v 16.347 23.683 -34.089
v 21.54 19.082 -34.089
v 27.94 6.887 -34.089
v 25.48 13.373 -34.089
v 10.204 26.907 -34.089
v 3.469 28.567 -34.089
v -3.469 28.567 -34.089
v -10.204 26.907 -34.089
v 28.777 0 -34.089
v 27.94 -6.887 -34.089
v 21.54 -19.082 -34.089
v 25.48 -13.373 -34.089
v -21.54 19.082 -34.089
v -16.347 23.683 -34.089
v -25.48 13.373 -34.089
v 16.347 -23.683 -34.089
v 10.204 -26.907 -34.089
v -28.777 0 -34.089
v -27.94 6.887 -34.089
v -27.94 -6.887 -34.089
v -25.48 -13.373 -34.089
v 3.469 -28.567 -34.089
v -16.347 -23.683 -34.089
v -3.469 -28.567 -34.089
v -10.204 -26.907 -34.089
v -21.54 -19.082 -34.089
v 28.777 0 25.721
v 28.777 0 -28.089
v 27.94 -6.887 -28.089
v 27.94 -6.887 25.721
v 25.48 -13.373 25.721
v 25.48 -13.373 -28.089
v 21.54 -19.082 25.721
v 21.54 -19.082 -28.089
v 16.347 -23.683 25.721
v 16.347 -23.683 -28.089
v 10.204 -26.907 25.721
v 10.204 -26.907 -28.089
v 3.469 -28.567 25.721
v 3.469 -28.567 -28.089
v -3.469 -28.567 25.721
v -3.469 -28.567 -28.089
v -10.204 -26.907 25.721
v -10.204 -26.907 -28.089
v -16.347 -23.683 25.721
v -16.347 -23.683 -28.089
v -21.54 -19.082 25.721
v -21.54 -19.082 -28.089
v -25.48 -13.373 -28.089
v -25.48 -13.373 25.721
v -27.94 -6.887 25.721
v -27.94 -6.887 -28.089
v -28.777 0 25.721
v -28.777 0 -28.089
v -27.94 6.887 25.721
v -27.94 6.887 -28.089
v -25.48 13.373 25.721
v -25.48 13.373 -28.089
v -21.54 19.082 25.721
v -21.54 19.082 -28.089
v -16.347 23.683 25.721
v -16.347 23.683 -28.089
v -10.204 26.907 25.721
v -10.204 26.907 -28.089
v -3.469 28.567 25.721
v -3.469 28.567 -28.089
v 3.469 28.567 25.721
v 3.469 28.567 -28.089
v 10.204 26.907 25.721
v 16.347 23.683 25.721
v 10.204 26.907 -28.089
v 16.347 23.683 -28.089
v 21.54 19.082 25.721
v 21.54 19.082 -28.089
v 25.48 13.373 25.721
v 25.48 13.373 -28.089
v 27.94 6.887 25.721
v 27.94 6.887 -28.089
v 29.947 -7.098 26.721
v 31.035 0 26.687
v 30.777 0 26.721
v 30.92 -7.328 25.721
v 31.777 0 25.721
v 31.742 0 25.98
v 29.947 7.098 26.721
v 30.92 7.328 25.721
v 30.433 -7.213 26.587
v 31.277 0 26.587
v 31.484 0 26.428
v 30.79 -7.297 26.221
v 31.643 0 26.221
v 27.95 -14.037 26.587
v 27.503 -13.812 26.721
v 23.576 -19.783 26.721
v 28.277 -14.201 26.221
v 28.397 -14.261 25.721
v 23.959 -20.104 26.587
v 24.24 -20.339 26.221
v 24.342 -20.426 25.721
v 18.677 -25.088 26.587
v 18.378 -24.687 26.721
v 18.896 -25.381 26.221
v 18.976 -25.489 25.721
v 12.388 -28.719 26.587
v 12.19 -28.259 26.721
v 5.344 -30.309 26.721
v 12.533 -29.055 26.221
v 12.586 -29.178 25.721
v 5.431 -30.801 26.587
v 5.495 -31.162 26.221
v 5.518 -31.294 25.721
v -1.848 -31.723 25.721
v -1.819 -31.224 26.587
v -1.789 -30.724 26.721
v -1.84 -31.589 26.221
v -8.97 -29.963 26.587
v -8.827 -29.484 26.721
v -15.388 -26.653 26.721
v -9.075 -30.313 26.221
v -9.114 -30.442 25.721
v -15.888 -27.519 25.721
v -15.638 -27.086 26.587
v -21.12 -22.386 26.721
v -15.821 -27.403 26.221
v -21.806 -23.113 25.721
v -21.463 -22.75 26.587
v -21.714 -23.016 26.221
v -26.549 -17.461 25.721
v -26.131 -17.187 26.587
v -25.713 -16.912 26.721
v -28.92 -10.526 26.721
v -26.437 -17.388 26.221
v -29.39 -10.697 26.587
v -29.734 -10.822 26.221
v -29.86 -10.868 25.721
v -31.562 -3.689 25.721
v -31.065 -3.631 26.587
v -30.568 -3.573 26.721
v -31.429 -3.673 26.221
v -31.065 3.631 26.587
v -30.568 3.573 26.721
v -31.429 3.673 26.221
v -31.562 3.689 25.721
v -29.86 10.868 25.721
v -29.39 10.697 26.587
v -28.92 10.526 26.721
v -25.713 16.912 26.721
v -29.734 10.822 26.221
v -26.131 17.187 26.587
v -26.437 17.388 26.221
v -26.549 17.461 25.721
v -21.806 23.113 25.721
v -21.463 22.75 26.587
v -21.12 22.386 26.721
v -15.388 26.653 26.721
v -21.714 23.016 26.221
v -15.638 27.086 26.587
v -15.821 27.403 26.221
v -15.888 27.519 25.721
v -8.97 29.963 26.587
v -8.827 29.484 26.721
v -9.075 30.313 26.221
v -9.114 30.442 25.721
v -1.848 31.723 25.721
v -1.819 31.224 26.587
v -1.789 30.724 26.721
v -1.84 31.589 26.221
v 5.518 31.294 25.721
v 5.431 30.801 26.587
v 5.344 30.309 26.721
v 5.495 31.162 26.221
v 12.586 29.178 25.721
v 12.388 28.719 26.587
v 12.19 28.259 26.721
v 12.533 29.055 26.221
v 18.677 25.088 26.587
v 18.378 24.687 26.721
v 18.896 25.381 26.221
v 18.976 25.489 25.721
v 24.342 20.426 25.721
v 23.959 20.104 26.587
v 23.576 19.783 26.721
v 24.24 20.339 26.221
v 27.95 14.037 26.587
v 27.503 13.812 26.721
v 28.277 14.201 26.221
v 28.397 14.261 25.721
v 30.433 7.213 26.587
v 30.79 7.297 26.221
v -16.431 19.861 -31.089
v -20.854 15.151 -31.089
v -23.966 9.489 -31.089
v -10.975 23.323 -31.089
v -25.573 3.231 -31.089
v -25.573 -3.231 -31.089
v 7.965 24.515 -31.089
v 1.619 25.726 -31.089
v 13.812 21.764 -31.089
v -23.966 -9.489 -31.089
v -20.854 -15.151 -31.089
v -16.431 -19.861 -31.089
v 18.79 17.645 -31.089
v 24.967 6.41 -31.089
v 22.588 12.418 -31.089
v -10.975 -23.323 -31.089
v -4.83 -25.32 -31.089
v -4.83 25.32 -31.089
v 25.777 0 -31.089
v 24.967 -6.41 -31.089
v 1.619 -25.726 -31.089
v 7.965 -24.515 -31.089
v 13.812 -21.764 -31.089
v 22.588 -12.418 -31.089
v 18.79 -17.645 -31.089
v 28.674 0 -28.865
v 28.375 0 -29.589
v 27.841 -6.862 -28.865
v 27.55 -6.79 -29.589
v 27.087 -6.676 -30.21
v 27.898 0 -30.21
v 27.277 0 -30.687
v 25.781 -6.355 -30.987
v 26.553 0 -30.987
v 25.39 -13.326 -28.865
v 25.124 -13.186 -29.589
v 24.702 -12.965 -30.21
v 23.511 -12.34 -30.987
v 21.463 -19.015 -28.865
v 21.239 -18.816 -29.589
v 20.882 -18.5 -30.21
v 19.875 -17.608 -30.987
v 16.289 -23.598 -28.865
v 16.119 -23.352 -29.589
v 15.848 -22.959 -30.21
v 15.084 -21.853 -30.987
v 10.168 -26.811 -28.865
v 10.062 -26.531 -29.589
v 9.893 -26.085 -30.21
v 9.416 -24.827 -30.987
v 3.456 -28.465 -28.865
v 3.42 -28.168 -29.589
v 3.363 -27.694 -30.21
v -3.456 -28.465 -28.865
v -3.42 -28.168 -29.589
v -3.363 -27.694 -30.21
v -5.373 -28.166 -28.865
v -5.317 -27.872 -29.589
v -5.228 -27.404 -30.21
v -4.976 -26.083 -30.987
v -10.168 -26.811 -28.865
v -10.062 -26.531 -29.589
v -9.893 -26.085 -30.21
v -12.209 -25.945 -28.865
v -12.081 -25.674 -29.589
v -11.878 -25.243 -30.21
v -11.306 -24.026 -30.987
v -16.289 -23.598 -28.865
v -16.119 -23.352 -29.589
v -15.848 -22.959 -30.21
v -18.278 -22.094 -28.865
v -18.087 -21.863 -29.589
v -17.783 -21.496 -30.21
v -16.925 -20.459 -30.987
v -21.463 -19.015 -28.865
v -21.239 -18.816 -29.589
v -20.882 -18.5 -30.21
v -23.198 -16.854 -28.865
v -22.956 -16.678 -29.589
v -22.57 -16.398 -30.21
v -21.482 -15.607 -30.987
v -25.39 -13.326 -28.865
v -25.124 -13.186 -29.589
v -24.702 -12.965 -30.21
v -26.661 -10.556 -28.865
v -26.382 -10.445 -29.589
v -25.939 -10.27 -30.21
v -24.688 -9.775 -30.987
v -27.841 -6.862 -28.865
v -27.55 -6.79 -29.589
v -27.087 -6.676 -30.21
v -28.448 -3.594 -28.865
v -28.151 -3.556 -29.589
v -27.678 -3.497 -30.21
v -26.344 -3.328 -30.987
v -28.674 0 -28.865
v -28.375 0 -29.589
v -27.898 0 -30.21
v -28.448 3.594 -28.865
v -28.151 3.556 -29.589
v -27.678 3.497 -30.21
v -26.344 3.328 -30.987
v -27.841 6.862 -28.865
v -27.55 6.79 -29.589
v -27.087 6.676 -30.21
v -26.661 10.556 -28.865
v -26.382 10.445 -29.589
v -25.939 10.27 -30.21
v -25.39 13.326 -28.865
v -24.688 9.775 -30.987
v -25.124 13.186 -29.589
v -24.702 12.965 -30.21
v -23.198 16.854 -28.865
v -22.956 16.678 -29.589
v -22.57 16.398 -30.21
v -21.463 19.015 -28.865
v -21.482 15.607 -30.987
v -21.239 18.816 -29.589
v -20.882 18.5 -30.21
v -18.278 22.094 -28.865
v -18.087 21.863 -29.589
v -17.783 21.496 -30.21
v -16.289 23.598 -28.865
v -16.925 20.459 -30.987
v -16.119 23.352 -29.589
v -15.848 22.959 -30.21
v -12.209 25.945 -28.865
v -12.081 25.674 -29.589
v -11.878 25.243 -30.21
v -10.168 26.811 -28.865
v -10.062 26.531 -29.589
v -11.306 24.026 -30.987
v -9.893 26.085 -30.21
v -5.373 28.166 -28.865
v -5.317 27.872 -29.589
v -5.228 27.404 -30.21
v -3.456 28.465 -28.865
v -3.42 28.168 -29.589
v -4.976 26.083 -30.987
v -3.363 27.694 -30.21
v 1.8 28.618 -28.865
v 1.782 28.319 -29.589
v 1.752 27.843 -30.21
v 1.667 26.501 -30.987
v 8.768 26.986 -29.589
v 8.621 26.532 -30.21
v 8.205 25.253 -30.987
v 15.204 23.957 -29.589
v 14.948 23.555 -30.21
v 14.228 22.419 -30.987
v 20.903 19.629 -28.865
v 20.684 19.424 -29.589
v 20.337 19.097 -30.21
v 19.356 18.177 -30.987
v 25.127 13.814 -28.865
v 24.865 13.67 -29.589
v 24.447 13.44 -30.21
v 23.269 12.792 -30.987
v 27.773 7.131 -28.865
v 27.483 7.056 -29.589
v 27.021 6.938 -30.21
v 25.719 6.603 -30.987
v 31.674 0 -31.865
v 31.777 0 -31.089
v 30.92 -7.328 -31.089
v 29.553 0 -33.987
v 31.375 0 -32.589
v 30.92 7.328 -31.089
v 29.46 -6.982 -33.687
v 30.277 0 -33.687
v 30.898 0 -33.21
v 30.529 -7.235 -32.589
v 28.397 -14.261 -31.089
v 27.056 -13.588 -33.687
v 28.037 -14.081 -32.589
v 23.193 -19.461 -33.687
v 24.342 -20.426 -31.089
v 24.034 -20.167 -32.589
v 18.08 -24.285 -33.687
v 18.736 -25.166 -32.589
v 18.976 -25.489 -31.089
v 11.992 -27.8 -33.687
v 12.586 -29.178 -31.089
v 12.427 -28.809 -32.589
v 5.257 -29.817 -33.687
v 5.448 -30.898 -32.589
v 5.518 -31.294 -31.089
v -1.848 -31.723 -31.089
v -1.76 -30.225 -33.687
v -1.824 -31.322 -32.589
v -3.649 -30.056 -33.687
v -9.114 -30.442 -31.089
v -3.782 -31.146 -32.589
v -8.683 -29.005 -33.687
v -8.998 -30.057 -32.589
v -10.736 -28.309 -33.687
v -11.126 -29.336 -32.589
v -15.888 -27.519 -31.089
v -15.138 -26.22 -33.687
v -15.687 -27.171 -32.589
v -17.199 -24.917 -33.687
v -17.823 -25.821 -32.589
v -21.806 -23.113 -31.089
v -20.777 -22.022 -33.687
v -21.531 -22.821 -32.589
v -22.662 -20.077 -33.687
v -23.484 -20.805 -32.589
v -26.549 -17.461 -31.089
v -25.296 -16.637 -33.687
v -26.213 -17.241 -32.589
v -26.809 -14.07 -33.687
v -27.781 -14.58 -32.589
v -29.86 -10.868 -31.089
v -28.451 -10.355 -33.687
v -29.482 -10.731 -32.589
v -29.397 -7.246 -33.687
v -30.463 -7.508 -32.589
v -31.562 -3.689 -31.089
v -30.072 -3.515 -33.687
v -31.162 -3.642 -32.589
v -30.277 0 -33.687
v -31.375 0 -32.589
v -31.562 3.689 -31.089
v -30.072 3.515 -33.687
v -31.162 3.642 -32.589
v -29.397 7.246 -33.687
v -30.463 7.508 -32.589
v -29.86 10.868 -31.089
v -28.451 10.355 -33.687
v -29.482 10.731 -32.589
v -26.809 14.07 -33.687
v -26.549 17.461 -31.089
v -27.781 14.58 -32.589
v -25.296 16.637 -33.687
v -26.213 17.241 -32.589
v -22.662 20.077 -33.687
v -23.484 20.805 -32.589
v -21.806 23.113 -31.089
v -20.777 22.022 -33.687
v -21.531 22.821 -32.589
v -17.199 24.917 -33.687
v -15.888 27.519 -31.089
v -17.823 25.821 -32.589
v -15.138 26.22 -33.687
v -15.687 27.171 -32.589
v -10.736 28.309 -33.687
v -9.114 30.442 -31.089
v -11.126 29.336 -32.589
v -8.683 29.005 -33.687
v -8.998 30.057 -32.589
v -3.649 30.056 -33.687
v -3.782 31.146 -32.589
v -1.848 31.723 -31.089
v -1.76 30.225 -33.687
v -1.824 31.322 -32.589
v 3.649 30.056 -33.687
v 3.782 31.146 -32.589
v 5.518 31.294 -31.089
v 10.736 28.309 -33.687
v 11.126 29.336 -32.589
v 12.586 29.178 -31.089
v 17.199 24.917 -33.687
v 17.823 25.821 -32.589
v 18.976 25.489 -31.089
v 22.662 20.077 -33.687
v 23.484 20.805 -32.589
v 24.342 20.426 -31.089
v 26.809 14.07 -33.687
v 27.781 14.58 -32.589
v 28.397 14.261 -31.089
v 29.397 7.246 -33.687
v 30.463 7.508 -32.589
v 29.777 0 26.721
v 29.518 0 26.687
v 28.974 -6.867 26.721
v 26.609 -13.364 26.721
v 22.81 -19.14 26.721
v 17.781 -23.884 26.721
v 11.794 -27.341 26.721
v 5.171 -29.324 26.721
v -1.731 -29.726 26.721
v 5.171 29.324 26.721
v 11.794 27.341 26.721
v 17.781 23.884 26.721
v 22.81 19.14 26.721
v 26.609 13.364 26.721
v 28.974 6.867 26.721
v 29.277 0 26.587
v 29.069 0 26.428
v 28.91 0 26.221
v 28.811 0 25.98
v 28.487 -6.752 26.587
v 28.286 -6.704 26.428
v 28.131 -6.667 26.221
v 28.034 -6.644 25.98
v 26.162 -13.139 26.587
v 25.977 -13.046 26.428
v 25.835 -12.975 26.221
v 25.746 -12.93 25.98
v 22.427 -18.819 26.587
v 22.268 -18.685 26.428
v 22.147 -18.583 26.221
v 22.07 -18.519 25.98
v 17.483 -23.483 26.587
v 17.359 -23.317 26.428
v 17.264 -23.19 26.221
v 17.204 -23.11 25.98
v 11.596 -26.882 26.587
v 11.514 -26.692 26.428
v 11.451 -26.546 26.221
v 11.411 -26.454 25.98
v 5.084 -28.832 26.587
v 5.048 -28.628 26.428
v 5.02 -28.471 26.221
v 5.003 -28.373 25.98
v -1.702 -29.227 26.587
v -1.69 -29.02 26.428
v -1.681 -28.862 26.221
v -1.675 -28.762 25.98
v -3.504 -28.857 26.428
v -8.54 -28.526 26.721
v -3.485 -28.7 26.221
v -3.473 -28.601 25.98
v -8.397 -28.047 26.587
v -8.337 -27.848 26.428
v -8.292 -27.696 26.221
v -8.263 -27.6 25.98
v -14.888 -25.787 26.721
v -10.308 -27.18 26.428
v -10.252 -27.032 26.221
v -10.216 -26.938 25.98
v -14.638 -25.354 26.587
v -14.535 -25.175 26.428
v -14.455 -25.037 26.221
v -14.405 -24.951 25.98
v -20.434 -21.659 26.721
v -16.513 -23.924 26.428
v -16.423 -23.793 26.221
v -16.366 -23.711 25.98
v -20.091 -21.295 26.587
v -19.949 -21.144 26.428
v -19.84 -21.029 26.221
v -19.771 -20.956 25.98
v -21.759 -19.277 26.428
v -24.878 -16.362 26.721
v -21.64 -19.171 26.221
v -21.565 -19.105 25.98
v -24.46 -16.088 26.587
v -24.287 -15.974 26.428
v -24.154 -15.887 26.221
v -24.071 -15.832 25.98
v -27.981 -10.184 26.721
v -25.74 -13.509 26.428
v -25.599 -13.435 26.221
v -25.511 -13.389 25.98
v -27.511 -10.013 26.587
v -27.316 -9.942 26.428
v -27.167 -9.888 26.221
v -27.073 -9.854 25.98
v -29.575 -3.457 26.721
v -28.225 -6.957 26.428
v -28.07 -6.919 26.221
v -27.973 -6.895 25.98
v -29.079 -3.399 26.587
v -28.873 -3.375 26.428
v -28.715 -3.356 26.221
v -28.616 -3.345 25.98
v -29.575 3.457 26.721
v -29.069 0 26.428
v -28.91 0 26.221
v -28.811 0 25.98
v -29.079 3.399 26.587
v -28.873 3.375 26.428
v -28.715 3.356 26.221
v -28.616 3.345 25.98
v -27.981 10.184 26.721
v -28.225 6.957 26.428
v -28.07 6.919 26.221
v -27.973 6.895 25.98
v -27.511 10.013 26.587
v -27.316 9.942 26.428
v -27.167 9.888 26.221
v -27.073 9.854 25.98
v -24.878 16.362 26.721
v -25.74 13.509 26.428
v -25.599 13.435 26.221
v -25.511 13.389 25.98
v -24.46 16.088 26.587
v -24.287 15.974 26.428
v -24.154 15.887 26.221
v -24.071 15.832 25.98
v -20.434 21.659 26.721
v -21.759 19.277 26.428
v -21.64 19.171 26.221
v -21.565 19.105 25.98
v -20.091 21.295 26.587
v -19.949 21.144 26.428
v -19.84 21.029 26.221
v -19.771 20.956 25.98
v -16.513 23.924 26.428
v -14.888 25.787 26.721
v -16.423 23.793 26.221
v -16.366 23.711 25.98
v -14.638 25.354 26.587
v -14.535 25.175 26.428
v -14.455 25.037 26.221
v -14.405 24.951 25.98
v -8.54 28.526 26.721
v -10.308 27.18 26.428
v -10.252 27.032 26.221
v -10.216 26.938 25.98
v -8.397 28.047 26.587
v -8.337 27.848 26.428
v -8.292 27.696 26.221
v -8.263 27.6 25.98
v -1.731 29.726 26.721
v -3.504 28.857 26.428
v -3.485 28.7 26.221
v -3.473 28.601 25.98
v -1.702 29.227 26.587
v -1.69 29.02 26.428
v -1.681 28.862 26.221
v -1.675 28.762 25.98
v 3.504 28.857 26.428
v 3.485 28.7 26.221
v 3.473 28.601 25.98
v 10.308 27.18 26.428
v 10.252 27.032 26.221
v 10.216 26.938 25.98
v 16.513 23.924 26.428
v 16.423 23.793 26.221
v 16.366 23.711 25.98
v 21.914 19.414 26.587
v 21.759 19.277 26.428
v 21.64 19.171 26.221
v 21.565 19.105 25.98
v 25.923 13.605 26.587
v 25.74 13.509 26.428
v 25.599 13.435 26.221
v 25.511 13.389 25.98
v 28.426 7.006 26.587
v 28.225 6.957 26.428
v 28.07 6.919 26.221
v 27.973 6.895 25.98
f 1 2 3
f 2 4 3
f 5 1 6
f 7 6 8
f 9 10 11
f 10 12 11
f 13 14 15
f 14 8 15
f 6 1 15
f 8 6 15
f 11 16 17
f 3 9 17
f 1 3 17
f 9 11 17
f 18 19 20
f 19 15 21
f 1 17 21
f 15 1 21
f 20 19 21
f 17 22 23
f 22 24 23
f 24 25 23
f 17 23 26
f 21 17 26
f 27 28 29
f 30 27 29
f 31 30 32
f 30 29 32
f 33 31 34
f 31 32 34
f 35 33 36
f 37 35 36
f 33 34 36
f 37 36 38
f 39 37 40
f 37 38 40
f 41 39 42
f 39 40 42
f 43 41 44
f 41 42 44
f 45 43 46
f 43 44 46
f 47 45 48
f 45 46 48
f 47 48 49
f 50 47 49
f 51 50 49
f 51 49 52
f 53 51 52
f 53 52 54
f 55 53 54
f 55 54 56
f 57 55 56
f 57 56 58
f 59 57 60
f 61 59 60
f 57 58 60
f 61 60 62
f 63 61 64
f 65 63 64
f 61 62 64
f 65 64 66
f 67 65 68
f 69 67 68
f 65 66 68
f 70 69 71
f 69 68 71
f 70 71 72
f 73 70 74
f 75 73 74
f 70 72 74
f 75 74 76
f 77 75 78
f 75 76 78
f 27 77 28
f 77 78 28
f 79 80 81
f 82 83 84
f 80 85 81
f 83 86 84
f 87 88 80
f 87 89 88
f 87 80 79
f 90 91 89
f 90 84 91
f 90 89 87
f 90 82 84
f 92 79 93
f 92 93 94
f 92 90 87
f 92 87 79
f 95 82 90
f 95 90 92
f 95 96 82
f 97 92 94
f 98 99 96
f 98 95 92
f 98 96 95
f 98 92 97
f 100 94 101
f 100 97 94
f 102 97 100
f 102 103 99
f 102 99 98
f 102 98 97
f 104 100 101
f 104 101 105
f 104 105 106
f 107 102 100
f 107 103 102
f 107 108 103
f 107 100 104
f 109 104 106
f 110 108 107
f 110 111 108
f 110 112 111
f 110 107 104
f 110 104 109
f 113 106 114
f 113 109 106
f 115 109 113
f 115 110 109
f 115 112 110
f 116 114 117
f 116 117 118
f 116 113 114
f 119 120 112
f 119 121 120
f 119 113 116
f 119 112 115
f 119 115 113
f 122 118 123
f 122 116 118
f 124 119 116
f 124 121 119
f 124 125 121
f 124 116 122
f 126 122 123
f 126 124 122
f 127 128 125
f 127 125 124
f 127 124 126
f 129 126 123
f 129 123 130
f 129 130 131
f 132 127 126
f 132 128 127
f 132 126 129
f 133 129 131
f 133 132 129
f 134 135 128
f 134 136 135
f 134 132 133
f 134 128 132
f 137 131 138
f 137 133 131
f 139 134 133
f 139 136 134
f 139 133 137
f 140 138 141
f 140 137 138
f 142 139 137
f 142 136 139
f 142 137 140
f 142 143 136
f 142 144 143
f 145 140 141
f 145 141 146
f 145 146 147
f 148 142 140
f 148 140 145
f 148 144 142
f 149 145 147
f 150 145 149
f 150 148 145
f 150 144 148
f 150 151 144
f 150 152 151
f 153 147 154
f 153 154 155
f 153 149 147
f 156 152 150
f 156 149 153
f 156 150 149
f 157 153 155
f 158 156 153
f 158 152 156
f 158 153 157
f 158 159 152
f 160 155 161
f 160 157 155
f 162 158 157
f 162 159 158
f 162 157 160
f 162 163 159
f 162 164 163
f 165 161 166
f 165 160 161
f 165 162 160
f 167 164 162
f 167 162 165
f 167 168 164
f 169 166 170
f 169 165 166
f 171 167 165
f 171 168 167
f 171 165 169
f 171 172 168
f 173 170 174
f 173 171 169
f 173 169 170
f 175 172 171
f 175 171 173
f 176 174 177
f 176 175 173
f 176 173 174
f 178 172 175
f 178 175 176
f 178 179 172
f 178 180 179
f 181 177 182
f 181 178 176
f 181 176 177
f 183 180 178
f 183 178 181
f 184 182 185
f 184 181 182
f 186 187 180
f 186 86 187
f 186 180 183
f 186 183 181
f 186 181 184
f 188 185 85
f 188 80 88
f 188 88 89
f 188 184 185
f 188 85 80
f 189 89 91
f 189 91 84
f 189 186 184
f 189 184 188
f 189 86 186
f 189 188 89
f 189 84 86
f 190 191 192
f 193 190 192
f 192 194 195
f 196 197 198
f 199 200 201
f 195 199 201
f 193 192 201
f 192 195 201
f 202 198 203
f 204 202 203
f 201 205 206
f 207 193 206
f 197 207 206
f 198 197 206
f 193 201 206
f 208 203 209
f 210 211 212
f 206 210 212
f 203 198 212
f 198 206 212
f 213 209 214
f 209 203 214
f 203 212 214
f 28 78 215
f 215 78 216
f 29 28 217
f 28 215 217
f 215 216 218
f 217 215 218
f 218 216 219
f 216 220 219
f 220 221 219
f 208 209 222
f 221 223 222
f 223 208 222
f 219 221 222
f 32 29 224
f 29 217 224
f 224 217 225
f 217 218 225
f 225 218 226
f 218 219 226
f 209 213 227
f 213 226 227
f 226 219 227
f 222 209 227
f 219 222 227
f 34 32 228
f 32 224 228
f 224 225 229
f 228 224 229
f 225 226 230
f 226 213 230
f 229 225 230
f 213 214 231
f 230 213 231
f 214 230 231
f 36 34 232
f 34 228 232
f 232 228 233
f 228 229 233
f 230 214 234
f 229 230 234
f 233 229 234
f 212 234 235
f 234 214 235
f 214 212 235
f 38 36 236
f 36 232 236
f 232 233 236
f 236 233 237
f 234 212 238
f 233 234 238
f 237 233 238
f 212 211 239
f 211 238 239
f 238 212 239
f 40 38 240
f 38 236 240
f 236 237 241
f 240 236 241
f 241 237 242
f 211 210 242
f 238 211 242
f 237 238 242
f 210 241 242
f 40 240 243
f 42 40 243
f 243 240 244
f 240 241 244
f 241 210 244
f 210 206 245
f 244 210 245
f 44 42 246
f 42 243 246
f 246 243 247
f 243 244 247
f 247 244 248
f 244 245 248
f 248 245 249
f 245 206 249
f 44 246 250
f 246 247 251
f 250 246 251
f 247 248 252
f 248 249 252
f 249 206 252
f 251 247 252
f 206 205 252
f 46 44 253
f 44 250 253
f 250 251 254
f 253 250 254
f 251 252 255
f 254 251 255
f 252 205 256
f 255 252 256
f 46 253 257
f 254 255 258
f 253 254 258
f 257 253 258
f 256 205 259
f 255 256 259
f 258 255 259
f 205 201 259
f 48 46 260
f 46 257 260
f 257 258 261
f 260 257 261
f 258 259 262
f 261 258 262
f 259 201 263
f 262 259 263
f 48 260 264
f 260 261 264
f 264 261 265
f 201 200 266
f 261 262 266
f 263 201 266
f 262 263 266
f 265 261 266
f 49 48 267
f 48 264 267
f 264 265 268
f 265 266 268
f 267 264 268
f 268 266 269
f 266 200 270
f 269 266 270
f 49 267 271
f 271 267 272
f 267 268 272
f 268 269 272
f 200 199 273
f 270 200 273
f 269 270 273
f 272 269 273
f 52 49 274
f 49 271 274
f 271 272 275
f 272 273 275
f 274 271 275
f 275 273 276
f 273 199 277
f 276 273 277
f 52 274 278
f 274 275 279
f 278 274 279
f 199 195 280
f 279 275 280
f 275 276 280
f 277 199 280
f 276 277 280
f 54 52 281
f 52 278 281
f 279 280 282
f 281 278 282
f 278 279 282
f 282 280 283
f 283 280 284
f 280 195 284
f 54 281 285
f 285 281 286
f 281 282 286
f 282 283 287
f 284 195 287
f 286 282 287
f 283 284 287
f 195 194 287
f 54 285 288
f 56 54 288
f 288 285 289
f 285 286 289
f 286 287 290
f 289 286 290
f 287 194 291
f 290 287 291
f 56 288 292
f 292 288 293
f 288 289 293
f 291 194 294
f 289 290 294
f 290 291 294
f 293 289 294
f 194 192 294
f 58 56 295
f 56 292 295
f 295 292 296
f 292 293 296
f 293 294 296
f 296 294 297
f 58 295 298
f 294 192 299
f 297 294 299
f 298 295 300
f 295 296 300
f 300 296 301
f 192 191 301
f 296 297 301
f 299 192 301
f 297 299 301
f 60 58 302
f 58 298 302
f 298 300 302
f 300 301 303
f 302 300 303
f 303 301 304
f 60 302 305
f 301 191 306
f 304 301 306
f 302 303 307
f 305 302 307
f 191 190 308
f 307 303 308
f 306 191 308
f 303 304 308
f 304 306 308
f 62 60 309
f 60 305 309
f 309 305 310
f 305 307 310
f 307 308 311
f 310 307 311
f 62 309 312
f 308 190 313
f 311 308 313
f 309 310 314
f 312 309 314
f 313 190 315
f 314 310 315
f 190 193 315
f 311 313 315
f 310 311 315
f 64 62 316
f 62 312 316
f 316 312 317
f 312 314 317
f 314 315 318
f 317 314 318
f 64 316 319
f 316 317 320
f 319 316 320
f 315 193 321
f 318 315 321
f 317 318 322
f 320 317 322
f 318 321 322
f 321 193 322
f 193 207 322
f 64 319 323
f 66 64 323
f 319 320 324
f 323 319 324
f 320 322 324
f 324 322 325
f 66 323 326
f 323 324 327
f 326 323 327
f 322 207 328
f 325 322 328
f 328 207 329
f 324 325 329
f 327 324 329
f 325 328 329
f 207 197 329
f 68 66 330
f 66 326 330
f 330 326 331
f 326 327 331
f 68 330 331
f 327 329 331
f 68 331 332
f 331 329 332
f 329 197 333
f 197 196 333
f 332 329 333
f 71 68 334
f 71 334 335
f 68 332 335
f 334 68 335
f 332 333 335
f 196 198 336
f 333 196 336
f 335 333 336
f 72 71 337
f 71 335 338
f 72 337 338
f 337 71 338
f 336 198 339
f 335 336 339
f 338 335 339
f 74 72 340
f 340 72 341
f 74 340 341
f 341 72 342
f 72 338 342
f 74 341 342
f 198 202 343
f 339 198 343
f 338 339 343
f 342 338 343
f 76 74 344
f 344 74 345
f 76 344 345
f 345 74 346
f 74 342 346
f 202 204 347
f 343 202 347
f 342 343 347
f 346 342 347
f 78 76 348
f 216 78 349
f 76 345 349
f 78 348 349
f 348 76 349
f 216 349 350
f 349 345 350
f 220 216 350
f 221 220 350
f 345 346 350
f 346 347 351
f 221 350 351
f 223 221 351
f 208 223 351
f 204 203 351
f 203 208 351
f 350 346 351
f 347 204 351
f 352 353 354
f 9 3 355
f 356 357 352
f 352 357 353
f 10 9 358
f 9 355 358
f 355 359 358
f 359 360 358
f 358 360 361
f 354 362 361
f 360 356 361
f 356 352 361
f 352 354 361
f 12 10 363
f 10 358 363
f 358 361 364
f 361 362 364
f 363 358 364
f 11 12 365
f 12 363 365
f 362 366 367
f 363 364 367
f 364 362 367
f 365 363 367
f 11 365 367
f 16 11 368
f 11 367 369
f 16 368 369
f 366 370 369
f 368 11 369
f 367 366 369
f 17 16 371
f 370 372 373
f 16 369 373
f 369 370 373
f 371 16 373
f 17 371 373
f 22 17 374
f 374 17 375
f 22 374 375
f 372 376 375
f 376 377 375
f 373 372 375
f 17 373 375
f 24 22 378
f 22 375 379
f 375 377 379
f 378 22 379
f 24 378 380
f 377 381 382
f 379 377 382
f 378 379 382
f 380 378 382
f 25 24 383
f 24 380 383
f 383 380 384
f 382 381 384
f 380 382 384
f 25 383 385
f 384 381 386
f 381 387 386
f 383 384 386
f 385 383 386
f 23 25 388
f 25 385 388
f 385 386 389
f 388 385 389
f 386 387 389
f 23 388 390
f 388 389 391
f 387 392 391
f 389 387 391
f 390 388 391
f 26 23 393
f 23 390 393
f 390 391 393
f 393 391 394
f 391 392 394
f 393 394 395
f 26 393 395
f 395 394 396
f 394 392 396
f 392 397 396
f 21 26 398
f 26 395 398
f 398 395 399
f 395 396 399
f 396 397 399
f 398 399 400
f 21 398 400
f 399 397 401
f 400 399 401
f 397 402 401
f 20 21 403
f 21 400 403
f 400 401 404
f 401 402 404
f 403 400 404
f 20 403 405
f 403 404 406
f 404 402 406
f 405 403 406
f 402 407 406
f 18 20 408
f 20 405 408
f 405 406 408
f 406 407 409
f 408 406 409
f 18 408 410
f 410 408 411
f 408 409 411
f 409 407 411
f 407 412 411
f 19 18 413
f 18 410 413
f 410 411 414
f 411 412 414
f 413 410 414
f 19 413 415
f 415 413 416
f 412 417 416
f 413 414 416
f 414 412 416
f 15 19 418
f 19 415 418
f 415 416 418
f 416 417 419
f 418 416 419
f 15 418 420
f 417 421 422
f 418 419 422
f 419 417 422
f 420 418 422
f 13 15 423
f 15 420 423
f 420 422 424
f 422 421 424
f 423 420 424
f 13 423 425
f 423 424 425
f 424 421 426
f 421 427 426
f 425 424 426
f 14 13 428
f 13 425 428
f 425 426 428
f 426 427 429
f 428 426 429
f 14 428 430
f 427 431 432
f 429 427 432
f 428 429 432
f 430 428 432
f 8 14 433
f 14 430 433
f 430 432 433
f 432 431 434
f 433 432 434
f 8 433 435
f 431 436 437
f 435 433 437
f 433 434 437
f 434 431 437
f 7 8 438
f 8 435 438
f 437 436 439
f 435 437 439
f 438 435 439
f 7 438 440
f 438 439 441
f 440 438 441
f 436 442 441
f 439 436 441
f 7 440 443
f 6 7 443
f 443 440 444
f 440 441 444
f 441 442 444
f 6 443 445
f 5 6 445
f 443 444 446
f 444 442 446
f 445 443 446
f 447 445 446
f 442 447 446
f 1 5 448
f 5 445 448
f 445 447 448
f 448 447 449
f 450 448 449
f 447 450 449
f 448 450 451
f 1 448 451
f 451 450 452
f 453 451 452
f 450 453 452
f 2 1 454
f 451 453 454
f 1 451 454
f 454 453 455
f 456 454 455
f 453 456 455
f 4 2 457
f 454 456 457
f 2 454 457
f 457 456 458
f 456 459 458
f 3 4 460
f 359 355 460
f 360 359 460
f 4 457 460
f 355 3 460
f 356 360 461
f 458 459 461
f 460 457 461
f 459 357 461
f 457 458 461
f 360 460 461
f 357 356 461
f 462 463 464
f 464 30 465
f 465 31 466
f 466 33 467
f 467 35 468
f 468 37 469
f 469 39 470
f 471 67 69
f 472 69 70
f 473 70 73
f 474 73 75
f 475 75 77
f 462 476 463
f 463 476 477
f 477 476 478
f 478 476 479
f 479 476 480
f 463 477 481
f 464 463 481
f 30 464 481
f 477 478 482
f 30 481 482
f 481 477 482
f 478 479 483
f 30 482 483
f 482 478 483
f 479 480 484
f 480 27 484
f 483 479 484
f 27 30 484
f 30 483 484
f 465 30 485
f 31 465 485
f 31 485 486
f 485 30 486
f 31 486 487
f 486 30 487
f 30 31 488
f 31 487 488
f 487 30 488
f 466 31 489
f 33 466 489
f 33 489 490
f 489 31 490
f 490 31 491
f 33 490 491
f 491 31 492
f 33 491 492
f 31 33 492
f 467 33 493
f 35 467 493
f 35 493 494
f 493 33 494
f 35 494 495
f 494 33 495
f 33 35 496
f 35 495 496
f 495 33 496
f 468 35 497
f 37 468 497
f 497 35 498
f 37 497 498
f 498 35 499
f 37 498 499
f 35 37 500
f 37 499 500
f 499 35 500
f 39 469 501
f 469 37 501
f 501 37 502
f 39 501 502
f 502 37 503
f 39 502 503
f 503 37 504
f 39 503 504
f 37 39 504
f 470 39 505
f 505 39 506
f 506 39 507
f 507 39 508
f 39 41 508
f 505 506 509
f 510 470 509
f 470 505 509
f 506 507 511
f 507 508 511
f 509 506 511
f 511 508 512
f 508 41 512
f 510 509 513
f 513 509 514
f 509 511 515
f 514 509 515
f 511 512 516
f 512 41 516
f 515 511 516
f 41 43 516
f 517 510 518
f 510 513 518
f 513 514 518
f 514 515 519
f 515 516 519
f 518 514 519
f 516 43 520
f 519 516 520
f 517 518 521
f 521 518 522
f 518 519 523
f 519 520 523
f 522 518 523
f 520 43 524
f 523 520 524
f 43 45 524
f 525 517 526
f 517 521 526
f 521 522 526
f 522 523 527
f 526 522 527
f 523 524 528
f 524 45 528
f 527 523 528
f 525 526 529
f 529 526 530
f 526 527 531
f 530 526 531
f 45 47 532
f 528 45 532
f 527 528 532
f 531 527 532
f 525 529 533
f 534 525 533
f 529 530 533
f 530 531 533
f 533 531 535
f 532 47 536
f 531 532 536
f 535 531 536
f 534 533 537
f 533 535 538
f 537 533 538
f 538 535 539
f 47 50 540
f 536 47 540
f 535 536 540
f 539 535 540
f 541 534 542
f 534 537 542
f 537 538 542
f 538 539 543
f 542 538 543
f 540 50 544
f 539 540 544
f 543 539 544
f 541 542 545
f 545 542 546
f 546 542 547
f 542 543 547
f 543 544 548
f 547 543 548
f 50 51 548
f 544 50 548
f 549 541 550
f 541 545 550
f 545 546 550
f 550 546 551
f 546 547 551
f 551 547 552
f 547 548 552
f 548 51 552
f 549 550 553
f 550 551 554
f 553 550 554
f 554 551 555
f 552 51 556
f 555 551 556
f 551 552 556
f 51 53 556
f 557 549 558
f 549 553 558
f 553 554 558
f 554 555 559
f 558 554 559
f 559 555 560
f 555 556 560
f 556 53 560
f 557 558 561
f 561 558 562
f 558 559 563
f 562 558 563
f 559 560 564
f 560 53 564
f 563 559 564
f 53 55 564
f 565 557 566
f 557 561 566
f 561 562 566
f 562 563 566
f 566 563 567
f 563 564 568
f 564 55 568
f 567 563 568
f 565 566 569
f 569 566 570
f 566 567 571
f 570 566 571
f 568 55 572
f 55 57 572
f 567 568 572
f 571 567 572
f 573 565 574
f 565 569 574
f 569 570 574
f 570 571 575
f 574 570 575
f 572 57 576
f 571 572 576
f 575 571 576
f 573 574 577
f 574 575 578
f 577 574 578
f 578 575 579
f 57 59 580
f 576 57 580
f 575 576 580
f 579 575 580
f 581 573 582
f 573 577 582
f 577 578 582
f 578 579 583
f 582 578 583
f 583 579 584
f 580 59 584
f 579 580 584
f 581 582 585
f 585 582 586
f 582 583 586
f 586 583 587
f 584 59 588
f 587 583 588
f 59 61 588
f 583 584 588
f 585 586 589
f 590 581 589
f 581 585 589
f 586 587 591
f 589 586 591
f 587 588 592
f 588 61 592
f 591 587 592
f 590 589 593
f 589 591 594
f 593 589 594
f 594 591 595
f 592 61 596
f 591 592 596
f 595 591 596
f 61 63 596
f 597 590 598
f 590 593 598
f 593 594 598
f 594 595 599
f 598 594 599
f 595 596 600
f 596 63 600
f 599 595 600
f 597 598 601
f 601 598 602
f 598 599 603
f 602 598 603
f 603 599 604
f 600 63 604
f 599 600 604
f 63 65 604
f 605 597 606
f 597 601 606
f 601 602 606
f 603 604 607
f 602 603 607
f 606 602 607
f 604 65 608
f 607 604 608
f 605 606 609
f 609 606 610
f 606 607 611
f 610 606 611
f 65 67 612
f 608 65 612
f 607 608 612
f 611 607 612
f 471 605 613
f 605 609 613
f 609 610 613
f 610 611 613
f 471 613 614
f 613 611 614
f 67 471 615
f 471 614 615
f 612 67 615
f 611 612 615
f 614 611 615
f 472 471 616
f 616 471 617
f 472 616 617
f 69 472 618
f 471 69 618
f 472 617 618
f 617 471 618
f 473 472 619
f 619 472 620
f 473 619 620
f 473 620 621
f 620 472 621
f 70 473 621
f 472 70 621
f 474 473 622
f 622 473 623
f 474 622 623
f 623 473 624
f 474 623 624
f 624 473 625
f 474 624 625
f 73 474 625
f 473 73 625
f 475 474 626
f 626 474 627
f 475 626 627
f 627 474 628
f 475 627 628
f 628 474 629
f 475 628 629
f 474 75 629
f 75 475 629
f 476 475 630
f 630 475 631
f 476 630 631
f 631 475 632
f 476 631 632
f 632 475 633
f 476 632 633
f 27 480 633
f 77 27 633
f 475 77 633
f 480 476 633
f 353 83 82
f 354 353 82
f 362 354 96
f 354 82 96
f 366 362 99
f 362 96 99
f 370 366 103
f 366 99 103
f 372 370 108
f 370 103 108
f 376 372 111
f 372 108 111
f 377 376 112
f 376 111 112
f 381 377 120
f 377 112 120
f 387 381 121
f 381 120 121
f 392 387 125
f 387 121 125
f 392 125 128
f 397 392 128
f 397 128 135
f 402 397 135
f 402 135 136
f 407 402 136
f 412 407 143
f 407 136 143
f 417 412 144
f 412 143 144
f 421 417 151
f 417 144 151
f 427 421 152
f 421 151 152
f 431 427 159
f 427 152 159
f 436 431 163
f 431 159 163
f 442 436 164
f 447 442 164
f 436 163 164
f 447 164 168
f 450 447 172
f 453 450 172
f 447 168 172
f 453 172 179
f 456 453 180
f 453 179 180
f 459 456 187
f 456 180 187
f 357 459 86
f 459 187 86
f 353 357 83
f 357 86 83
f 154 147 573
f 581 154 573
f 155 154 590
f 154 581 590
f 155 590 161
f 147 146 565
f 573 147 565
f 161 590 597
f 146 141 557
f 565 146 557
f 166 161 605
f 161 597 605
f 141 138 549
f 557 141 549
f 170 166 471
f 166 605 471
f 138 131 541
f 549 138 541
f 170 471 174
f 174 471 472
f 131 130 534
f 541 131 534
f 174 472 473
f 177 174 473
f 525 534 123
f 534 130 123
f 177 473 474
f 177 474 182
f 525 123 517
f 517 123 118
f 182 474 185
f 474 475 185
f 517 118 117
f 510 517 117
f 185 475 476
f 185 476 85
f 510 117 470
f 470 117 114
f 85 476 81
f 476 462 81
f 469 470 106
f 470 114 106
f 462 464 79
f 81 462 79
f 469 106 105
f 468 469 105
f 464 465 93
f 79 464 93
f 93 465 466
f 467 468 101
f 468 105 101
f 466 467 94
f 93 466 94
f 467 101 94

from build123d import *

# Parameters (mm, degrees)
F2_R = 1
F3_R = 1


with BuildPart() as f1:
    # F0 (on Front) → F1 (revolve)
    with BuildSketch(Plane.XZ):
        with BuildLine():
            Line((25.776508, -31.088909), (0, -31.088909))
            Line((0, -31.088909), (0, -34.088909))
            Line((0, -34.088909), (28.776508, -34.088909))
            ThreePointArc((28.776508, -34.088909), (30.897828, -33.210229), (31.776508, -31.088909))
            Line((31.776508, -31.088909), (31.776508, 26.721045))
            Line((31.776508, 26.721045), (28.776508, 26.721045))
            Line((28.776508, 26.721045), (28.776508, -28.088909))
            ThreePointArc((28.776508, -28.088909), (27.897828, -30.210229), (25.776508, -31.088909))
        make_face()
    revolve(axis=Axis((0, 0, -7.964928), (0, 0, -1)))

    # F2
    f2_edges = [f1.edges().sort_by_distance(p)[0] for p in [
        (-28.776508, 0, 26.721045),
    ]]
    fillet(f2_edges, radius=F2_R)

    # F3
    f3_edges = [f1.edges().sort_by_distance(p)[0] for p in [
        (-31.776508, 0, 26.721045),
    ]]
    fillet(f3_edges, radius=F3_R)


solid = f1.part
